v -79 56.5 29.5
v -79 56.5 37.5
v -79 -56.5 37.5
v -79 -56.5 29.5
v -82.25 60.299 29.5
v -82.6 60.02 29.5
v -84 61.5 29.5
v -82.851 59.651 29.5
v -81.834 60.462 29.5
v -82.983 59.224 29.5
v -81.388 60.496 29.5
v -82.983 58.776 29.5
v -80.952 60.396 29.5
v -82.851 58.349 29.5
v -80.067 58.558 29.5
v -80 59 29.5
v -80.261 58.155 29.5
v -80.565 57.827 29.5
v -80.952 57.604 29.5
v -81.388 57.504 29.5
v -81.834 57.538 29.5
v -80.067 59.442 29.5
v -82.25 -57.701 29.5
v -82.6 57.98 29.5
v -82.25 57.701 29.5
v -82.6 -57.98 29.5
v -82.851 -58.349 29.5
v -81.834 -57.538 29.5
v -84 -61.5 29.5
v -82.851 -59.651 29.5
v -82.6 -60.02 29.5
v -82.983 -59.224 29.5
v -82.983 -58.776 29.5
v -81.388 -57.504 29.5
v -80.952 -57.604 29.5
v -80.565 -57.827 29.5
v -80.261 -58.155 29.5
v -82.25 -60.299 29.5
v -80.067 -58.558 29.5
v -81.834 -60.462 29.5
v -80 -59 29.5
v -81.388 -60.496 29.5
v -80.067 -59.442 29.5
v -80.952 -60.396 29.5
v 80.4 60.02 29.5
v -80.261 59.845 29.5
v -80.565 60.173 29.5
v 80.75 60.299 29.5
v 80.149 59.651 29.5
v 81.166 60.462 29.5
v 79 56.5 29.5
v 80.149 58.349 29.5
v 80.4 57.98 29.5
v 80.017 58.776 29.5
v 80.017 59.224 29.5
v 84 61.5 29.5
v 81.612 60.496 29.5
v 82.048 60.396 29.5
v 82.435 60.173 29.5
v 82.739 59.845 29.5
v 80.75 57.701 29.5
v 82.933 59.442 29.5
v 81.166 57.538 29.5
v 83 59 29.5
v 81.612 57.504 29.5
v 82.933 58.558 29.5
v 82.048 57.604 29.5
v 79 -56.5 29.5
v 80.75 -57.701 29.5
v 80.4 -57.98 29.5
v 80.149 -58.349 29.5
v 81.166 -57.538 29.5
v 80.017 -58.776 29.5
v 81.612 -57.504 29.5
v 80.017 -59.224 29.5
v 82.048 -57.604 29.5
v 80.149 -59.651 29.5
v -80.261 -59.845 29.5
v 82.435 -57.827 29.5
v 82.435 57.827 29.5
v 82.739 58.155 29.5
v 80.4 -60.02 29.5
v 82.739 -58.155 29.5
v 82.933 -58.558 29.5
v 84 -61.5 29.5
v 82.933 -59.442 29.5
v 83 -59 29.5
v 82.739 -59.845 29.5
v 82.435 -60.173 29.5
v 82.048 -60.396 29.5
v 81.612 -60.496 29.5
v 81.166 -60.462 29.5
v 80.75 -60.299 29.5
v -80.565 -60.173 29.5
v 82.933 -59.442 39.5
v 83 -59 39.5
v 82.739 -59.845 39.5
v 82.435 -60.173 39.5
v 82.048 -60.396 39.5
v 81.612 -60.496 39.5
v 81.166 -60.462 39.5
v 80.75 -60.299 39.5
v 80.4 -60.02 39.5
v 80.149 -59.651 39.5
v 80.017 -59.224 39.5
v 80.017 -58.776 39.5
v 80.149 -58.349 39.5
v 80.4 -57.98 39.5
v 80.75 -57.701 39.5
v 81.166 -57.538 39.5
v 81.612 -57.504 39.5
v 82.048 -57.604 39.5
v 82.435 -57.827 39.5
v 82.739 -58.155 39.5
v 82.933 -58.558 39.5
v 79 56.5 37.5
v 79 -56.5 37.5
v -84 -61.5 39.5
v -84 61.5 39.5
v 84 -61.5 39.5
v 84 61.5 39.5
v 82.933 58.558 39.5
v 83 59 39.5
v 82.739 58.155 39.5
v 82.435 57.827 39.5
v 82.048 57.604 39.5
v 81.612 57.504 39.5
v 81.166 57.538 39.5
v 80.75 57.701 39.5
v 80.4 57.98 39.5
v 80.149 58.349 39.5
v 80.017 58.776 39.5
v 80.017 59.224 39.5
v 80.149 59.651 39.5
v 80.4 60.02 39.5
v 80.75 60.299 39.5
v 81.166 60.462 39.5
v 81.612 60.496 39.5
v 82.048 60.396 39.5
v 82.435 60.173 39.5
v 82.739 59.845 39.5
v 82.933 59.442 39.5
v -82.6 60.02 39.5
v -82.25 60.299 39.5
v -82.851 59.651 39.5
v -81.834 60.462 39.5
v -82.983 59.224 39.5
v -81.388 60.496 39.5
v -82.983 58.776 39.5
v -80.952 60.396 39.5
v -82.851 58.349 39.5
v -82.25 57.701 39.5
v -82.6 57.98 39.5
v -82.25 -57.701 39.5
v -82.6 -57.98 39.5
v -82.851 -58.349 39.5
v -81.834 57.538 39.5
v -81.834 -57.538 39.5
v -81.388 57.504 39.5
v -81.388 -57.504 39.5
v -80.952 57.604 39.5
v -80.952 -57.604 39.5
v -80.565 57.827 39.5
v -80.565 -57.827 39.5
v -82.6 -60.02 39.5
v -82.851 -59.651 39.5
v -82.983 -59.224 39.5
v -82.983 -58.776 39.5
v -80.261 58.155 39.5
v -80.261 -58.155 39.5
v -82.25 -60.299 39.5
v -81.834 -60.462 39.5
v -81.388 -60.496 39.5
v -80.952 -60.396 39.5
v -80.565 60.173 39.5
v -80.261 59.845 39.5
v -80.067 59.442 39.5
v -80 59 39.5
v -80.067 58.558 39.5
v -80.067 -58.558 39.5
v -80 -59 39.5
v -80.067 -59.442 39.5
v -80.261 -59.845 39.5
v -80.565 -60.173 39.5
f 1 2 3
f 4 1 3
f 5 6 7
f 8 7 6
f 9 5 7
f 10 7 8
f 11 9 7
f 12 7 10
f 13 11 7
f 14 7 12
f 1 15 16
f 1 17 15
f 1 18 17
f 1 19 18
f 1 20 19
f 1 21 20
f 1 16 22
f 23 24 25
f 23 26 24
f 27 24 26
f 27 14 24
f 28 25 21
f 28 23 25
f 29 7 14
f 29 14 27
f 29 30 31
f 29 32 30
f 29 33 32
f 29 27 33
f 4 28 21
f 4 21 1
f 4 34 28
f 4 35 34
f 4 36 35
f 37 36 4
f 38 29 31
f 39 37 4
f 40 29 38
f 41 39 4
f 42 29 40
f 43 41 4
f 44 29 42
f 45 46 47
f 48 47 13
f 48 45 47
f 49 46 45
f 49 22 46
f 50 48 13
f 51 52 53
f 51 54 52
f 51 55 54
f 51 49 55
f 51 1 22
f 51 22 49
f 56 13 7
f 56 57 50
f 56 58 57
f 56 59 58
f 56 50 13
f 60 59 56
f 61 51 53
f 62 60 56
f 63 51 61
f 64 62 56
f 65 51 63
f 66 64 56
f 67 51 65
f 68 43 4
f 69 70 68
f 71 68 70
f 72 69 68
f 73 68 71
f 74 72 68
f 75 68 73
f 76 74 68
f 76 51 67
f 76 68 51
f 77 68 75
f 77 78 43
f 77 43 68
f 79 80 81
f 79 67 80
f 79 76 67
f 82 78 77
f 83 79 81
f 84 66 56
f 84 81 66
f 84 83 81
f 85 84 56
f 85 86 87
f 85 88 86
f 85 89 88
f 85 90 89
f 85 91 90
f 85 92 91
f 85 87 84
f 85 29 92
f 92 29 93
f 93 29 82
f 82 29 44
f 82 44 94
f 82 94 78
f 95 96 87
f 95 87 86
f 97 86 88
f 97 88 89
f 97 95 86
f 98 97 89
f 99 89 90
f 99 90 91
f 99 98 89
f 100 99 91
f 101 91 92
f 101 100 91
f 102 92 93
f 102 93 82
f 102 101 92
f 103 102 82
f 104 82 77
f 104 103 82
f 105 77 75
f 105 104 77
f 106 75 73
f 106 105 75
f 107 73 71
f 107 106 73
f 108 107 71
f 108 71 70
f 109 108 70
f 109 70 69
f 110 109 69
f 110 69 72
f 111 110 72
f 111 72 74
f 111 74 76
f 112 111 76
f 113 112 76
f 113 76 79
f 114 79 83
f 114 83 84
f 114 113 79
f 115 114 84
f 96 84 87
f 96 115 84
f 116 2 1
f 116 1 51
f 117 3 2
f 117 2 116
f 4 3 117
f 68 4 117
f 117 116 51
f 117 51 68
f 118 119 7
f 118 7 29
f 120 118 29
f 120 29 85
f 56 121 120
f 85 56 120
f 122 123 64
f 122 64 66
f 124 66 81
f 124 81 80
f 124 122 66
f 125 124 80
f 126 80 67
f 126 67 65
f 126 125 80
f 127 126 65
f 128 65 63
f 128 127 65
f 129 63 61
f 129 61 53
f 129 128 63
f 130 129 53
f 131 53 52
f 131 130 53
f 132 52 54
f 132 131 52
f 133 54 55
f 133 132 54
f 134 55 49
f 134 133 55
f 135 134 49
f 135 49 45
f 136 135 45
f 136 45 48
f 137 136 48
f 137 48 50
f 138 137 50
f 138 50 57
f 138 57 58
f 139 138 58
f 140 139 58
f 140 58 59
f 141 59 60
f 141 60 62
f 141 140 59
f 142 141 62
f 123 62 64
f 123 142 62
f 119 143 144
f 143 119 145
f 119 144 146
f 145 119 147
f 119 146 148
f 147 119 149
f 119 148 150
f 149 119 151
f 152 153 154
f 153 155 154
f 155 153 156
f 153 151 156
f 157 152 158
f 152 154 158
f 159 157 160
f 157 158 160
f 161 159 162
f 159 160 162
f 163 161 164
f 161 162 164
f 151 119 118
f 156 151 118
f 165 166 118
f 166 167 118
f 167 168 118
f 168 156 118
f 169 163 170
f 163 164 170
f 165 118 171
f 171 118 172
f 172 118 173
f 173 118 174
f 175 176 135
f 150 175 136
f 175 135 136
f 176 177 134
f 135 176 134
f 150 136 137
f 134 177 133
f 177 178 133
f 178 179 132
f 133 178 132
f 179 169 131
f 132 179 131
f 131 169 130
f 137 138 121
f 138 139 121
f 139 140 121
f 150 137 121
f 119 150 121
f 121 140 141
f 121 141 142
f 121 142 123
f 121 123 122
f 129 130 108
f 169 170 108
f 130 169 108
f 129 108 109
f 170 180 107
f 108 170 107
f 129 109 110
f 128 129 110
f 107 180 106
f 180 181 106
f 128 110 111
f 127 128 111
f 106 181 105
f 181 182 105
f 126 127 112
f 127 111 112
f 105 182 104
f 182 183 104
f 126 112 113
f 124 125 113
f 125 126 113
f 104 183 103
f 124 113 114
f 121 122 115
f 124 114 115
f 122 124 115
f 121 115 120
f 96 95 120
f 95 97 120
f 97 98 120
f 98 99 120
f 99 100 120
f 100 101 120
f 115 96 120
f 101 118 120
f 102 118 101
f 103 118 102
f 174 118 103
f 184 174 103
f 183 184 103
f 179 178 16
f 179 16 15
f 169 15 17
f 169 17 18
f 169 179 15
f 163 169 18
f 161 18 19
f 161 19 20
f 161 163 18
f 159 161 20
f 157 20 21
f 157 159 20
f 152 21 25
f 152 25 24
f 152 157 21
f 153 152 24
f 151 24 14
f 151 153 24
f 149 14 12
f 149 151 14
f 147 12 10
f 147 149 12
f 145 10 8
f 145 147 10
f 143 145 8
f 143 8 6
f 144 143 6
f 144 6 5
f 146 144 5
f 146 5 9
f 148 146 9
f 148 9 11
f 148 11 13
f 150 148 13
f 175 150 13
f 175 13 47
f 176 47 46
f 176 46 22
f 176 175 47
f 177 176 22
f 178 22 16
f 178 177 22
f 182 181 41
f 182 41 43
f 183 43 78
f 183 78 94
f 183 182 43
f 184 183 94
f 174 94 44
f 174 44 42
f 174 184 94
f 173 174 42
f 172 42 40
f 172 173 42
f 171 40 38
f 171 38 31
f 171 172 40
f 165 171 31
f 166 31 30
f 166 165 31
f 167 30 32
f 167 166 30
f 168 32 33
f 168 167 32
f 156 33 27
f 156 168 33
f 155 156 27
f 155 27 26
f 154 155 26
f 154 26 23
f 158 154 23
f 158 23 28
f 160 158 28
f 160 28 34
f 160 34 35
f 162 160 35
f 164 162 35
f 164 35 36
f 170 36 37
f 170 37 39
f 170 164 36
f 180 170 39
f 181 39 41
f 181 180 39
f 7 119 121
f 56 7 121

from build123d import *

# Parameters (mm, degrees)
SKETCH013_W               = 160
SKETCH013_H               = 115
EXTRUDE013_DEPTH          = 2
SKETCH012_W               = 168
SKETCH012_H               = 123
SKETCH012_R               = 1.5
SKETCH012_W_2             = 158
SKETCH012_H_2             = 113
EXTRUDE012_DEPTH          = 10
FUSION003_PLACEMENT_ANGLE = 180


with BuildPart() as extrude013:
    # Sketch013 → Extrude013 (new body)
    with BuildSketch(Plane.XY):
        Rectangle(SKETCH013_W, SKETCH013_H)
    extrude(amount=EXTRUDE013_DEPTH)


with BuildPart() as fusion003:
    # Sketch012 → Extrude012 (new body)
    with BuildSketch(Plane.XY):
        Rectangle(SKETCH012_W, SKETCH012_H)
        with Locations((-81.5, 59)):
            Circle(SKETCH012_R, mode=Mode.SUBTRACT)
        with Locations((81.5, 59)):
            Circle(SKETCH012_R, mode=Mode.SUBTRACT)
        with Locations((81.5, -59)):
            Circle(SKETCH012_R, mode=Mode.SUBTRACT)
        with Locations((-81.5, -59)):
            Circle(SKETCH012_R, mode=Mode.SUBTRACT)
        Rectangle(SKETCH012_W_2, SKETCH012_H_2, mode=Mode.SUBTRACT)
    extrude(amount=EXTRUDE012_DEPTH)

    # Fusion003: union Extrude013
    add(extrude013.part)


with BuildPart() as fusion003_1:
    # Fusion003 placement: moved
    add(fusion003.part.moved(Location((0, 0, 39.5))).rotate(Axis((0, 0, 39.5), (1, 0, 0)), FUSION003_PLACEMENT_ANGLE))


solid = fusion003_1.part
